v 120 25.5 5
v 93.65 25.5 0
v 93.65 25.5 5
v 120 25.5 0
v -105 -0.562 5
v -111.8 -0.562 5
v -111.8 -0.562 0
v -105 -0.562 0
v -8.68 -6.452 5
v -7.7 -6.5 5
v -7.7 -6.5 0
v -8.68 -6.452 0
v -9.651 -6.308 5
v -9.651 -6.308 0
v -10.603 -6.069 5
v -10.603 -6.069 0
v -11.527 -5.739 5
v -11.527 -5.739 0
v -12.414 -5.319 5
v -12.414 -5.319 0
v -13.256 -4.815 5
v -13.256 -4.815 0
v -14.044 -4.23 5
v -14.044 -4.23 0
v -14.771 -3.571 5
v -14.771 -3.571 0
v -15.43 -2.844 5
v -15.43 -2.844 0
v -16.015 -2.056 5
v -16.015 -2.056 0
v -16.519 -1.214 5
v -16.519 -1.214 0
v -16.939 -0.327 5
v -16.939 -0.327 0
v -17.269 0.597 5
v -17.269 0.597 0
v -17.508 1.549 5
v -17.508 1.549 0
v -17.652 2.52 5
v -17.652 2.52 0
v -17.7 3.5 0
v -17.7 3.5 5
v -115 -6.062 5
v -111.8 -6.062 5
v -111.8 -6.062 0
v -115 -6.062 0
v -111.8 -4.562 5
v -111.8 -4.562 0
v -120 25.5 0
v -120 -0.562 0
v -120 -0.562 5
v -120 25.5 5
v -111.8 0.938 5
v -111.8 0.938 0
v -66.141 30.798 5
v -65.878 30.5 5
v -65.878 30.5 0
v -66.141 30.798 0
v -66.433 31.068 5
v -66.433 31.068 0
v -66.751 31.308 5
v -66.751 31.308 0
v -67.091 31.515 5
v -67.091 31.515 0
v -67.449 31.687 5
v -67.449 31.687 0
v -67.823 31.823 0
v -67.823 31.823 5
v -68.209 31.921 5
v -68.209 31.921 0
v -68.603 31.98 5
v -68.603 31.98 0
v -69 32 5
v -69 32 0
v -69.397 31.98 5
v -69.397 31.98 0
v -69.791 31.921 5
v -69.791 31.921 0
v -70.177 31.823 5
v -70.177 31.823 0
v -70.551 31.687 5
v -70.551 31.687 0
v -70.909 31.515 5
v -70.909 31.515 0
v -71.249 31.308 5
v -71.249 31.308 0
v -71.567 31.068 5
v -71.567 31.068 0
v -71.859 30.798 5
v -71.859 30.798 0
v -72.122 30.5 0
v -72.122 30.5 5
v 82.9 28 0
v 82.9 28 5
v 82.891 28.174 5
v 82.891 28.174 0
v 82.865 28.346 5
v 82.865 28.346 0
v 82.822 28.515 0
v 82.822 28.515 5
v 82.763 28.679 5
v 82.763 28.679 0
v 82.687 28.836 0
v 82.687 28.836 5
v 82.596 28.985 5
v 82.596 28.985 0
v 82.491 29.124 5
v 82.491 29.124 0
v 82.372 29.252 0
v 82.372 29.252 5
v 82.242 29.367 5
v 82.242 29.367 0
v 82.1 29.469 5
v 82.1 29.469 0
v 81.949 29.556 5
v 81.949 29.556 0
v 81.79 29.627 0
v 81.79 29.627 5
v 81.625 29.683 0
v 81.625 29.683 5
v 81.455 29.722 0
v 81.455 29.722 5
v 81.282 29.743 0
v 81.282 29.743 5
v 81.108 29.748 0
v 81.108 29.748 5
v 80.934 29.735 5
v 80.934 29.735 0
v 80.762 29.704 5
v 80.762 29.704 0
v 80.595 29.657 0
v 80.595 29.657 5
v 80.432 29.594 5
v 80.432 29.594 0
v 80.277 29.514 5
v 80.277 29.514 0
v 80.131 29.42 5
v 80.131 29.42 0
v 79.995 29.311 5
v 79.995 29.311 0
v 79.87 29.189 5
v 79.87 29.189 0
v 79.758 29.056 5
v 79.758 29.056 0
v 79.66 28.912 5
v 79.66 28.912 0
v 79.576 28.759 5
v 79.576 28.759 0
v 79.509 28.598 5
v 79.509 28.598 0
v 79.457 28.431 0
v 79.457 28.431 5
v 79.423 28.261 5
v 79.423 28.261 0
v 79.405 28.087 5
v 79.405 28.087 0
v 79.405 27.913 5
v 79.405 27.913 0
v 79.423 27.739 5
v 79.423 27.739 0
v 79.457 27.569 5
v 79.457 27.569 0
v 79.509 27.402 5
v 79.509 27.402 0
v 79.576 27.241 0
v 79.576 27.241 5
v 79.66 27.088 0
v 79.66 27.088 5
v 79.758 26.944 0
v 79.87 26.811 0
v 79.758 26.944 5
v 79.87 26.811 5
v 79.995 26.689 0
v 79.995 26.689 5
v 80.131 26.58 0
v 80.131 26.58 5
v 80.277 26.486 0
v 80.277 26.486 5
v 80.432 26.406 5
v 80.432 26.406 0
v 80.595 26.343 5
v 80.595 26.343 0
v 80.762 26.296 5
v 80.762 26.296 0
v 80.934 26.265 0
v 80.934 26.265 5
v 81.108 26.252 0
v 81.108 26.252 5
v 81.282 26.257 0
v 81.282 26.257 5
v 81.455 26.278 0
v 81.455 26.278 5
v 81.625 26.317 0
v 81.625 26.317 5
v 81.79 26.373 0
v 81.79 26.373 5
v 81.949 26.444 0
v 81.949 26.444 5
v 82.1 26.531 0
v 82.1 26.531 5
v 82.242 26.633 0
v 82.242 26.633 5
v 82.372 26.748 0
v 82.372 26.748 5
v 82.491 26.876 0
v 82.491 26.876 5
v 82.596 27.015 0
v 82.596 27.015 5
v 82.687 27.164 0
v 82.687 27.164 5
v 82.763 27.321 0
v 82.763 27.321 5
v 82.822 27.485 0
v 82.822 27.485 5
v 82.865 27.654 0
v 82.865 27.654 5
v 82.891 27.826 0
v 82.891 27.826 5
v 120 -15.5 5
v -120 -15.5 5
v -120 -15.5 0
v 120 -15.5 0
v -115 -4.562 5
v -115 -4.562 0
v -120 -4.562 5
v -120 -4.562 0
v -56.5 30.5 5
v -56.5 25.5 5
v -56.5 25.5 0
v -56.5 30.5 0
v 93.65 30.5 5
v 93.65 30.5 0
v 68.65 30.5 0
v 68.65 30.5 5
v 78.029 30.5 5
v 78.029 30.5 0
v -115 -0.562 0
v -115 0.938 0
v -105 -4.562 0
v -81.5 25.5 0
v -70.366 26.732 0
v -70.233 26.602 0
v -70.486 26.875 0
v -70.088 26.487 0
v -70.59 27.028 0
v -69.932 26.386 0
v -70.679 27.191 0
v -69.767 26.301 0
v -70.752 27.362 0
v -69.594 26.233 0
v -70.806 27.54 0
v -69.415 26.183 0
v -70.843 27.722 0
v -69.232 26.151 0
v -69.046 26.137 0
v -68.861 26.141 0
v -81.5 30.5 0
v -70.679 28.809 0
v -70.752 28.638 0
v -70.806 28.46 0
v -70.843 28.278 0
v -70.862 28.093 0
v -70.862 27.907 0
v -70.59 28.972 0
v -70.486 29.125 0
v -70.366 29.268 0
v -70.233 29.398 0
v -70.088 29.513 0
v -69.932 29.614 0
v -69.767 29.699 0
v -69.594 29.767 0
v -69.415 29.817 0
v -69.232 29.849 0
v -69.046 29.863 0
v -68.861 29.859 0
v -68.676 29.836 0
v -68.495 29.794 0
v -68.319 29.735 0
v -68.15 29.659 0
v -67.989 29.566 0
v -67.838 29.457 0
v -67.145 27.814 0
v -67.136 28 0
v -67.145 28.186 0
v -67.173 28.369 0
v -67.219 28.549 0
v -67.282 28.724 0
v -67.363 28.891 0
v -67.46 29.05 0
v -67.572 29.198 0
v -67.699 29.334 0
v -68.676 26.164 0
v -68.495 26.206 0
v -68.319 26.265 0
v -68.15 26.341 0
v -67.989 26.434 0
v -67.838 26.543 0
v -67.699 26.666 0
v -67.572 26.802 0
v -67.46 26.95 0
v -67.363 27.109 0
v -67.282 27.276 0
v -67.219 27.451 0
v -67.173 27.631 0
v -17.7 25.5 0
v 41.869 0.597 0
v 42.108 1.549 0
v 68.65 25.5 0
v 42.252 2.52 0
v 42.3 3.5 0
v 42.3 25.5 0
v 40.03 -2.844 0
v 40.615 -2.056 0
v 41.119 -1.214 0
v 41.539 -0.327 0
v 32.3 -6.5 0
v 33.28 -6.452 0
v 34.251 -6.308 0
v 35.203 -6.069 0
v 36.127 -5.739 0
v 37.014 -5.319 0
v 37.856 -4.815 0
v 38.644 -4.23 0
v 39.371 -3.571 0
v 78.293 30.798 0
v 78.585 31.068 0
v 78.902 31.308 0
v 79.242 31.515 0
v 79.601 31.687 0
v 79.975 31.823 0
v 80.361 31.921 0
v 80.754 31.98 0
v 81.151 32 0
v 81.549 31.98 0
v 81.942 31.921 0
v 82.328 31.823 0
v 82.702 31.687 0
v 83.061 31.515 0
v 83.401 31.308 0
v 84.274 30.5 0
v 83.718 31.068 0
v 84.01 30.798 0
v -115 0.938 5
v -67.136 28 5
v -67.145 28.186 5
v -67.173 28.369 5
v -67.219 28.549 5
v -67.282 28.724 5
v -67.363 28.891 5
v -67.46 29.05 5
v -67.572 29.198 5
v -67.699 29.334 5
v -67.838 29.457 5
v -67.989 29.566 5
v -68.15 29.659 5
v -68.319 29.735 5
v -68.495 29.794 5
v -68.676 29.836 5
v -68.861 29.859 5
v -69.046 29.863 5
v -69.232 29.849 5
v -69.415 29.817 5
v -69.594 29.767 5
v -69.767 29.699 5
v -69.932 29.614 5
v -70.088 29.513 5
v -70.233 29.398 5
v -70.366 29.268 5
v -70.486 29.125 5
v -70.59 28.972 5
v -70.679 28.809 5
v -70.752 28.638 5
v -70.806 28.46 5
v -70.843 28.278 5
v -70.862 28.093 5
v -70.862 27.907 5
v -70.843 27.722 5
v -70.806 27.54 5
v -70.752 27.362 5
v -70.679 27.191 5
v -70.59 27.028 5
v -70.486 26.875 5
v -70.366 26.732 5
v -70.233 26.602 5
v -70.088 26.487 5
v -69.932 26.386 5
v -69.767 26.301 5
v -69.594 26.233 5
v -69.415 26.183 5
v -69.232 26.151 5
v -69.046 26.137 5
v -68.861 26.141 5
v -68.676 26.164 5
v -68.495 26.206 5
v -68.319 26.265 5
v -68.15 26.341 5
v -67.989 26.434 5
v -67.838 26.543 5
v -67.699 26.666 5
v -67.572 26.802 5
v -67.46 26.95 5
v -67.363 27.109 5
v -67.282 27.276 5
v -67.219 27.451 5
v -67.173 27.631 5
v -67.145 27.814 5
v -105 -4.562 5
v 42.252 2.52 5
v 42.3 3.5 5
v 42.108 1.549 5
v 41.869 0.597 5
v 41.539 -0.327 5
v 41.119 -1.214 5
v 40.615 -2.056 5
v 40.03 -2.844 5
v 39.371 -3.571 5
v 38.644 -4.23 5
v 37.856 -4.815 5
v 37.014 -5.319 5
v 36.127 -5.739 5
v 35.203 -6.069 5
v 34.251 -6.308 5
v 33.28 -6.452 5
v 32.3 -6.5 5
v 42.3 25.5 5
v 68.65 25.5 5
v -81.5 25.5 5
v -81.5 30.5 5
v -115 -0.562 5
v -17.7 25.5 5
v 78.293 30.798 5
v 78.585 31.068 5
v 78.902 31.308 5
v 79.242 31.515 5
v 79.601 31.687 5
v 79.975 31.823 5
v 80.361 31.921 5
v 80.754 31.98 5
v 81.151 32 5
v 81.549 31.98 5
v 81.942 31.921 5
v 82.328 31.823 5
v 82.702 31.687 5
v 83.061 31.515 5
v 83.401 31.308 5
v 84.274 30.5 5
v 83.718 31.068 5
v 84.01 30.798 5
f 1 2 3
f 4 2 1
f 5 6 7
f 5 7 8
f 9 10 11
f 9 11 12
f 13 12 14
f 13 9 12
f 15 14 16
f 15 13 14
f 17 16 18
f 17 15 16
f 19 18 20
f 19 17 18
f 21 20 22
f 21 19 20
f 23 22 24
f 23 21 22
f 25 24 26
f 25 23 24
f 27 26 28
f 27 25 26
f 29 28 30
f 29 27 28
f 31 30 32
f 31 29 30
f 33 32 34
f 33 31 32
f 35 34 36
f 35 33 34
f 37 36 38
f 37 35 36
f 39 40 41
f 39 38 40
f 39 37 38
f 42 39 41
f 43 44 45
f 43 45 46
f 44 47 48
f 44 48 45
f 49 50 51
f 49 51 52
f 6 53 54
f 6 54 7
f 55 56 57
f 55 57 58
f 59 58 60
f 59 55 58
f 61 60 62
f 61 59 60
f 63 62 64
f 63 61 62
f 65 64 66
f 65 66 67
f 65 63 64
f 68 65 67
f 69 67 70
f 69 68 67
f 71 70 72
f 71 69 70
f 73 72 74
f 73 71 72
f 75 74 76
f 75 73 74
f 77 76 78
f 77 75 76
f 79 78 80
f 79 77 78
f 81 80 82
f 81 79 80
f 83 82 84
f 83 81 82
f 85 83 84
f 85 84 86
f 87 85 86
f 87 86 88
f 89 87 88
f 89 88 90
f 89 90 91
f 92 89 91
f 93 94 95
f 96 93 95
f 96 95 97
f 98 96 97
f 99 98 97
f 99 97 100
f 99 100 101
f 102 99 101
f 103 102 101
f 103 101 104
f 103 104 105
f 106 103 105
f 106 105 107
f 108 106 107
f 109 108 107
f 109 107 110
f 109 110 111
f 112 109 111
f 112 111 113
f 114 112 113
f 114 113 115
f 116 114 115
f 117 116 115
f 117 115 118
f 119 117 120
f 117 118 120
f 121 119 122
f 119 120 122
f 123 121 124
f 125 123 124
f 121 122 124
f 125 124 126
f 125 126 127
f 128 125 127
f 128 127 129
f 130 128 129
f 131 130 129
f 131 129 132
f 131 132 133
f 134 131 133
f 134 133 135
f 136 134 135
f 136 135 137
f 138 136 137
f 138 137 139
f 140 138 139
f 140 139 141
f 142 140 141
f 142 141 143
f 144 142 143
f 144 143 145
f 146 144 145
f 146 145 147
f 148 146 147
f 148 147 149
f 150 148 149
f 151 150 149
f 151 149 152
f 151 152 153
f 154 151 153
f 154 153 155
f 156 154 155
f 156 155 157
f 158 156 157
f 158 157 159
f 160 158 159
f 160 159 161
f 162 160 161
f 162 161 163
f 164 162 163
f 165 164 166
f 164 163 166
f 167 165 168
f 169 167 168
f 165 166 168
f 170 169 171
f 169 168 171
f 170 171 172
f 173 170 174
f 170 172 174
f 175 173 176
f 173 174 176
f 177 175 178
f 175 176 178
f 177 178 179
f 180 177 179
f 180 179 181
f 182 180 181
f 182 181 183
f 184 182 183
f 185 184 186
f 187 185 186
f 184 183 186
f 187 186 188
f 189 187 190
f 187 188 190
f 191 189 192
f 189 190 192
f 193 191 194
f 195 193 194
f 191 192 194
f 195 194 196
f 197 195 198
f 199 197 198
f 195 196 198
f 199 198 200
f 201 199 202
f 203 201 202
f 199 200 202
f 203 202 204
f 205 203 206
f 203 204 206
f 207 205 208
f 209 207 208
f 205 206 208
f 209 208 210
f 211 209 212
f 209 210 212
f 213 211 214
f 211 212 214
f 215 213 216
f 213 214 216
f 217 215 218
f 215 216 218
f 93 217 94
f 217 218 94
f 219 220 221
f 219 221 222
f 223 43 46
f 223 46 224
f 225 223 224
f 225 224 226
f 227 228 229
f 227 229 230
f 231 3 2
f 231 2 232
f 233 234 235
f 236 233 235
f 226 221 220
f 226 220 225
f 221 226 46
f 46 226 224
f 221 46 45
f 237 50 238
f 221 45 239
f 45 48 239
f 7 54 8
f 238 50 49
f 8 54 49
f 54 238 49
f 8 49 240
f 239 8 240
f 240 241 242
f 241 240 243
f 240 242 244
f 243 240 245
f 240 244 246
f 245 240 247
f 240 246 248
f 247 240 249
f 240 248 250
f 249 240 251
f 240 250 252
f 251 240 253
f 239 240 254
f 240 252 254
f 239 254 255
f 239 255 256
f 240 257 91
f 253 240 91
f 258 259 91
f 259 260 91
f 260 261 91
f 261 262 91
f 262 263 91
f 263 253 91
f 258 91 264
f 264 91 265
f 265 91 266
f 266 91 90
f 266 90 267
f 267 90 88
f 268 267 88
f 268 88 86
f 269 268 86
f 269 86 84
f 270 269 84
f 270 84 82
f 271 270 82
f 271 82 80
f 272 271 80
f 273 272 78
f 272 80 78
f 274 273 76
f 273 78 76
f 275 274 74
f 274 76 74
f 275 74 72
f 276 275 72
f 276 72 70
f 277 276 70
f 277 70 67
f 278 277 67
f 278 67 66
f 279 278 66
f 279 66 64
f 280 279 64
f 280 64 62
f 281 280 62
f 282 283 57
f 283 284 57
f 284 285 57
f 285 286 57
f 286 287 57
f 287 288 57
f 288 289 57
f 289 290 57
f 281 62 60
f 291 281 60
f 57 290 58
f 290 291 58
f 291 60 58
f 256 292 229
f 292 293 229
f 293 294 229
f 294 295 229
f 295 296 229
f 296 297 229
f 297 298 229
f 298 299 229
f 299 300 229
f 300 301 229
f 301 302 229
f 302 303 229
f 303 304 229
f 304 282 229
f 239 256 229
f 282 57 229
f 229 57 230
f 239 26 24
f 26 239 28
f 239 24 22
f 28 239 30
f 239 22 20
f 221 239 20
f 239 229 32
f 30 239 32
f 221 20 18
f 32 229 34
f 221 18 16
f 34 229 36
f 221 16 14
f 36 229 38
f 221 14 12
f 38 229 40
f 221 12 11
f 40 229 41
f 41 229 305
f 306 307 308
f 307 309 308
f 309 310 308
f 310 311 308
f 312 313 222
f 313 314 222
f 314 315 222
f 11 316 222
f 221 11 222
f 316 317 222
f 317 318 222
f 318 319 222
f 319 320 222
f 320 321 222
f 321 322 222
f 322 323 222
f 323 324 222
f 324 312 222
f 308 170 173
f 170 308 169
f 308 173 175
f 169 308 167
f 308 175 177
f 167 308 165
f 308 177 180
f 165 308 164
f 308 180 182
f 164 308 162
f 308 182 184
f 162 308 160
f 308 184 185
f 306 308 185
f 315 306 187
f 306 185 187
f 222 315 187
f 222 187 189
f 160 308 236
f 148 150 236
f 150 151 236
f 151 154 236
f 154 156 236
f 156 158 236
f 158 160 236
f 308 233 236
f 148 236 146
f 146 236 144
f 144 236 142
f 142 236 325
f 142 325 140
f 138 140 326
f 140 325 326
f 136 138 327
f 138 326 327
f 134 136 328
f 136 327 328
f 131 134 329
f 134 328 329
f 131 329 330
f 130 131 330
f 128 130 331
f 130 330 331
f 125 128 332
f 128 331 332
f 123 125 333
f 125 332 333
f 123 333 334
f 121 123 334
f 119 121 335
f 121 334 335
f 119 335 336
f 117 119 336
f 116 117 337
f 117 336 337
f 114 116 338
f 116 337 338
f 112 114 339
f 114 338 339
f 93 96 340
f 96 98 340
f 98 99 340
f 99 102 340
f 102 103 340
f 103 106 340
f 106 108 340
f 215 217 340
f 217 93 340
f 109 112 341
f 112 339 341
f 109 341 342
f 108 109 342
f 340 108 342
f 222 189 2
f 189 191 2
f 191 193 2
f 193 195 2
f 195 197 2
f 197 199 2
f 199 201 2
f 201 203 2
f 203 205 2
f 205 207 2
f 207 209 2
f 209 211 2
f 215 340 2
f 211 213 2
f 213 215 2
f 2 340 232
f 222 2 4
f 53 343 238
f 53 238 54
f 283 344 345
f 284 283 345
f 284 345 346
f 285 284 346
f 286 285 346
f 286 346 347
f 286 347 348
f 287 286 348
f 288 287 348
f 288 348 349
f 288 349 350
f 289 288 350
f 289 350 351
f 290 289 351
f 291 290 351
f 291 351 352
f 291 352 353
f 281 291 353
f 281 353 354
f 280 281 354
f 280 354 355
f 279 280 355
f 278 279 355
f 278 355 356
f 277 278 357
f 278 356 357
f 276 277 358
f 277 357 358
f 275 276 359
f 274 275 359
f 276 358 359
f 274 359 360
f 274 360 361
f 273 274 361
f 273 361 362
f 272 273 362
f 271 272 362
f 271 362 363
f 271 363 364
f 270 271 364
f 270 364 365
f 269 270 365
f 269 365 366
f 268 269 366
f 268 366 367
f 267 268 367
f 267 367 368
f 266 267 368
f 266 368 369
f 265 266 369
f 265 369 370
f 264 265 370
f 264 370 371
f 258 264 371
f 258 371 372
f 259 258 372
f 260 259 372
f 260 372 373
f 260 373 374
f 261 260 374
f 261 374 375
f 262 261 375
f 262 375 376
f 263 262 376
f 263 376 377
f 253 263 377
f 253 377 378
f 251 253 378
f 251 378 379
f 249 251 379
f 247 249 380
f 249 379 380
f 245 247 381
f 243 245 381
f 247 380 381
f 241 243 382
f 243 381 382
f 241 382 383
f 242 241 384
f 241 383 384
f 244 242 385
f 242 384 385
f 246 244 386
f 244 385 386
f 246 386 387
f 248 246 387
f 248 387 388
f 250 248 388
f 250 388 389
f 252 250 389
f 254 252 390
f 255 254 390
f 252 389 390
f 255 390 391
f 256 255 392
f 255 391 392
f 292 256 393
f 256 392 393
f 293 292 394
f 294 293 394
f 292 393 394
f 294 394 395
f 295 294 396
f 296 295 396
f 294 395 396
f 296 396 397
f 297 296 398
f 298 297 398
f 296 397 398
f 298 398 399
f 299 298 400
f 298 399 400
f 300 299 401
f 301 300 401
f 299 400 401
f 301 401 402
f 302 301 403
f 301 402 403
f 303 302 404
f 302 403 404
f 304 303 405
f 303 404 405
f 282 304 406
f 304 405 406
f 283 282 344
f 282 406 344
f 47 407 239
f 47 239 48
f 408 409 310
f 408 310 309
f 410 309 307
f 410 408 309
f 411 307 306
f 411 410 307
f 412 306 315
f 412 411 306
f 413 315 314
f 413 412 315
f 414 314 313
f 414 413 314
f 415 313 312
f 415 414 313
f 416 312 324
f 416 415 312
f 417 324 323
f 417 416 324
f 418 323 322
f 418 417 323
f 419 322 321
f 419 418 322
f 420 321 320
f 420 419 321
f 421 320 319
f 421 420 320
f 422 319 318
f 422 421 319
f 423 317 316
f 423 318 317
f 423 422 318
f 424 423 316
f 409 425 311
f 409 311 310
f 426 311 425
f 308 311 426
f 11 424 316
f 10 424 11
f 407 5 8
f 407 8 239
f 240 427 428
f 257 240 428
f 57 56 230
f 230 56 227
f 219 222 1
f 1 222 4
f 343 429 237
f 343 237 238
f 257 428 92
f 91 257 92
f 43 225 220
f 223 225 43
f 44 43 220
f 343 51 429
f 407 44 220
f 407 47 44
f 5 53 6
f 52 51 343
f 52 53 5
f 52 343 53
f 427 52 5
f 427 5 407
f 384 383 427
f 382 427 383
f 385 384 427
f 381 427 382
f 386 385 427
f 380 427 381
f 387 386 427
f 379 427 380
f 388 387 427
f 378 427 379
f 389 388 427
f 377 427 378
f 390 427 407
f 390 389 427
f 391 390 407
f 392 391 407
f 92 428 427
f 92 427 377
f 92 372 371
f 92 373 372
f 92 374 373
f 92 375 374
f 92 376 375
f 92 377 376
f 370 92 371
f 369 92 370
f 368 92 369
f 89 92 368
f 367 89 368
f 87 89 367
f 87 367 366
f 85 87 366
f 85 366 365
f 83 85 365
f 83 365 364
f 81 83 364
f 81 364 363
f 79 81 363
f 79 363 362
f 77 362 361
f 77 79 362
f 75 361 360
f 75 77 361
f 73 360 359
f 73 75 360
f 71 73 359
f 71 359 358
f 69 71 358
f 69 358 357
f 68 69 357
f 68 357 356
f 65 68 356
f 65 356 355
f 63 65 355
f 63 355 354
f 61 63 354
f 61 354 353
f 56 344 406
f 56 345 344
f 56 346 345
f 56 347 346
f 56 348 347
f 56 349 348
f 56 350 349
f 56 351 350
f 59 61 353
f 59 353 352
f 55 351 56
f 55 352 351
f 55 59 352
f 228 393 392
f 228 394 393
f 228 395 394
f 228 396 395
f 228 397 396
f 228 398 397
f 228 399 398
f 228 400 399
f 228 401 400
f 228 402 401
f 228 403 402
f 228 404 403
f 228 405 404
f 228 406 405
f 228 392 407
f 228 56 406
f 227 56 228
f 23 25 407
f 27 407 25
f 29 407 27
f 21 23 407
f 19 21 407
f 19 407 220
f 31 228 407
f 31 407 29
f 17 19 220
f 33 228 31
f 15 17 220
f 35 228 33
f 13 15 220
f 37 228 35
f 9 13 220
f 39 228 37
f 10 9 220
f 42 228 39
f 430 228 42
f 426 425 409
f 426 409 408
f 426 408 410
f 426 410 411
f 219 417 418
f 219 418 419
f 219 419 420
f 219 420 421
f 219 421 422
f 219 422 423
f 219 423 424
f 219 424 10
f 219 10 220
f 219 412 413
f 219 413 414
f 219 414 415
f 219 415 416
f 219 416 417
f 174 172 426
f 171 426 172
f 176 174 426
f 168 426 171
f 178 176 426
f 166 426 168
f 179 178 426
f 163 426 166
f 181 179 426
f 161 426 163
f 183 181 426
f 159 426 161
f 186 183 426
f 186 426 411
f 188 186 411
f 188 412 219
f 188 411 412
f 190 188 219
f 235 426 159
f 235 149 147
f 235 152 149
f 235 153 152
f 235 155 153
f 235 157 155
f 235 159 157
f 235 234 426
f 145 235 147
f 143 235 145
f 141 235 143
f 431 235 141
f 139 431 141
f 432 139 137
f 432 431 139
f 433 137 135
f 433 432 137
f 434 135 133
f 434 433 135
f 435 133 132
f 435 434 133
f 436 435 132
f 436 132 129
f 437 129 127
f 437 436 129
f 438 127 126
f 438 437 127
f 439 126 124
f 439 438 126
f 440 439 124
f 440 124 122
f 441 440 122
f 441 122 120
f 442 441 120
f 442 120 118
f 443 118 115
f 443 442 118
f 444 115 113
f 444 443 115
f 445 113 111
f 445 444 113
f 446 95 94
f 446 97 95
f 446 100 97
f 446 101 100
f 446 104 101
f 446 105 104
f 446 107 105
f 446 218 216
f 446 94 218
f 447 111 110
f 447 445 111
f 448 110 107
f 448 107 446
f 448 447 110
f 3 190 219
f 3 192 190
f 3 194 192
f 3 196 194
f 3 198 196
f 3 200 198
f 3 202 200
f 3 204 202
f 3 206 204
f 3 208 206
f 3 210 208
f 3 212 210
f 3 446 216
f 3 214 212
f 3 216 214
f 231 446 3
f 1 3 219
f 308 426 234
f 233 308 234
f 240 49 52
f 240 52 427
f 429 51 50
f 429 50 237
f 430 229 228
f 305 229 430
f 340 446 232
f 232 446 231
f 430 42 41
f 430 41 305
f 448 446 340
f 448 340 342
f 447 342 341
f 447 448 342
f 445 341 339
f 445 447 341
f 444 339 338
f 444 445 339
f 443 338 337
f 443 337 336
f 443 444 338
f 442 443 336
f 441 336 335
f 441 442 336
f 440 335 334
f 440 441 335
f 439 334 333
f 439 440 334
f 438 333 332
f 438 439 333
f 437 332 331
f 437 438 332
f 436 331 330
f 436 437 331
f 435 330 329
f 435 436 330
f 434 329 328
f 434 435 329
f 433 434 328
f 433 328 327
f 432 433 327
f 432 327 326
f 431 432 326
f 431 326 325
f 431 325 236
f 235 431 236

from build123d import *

# Parameters (mm, degrees)
SKETCH1_W           = 240
SKETCH1_H           = 51
BOSS_EXTRUDE1_DEPTH = 5
SKETCH4_W           = 25
SKETCH4_H           = 5
BOSS_EXTRUDE2_DEPTH = 5
CUT_EXTRUDE1_DEPTH  = 10
CUT_EXTRUDE4_DEPTH  = 10
SKETCH15_W          = 25
SKETCH15_H          = 5
BOSS_EXTRUDE4_DEPTH = 5
SKETCH17_R          = 1.863928877
SKETCH17_R_2        = 1.748329033
CUT_EXTRUDE5_DEPTH  = 10
SKETCH18_R          = 4
SKETCH18_R_2        = 1.748329033
SKETCH18_R_3        = 1.863928877
BOSS_EXTRUDE5_DEPTH = 5
SKETCH19_W          = 240
SKETCH19_H          = 10
CUT_EXTRUDE6_DEPTH  = 10


with BuildPart() as part:
    # Sketch1 → Boss-Extrude1 (new body)
    with BuildSketch(Plane.XY):
        Rectangle(SKETCH1_W, SKETCH1_H)
    extrude(amount=BOSS_EXTRUDE1_DEPTH)

    # Sketch4 → Boss-Extrude2 (add)
    with BuildSketch(Plane.XY.offset(5)):
        with Locations((-69, 28)):
            Rectangle(SKETCH4_W, SKETCH4_H)
    extrude(amount=-BOSS_EXTRUDE2_DEPTH)

    # Sketch6 → Cut-Extrude1 (cut)
    with BuildSketch(Plane.XY.offset(5)):
        Polygon((-115, -4.562158061), (-120, -4.562158061), (-120, -0.562158061), (-115, -0.562158061), (-115, 0.937841939), (-111.8, 0.937841939), (-111.8, -0.562158061), (-105, -0.562158061), (-105, -4.562158061), (-111.8, -4.562158061), (-111.8, -6.062158061), (-115, -6.062158061), align=None)
    extrude(amount=-CUT_EXTRUDE1_DEPTH, mode=Mode.SUBTRACT)

    # Sketch14 → Cut-Extrude4 (cut)
    with BuildSketch(Plane.XY.offset(5)):
        with BuildLine():
            Line((-17.7, 25.5), (42.3, 25.5))
            Line((42.3, 25.5), (42.3, 3.5))
            ThreePointArc((42.3, 3.5), (39.371067812, -3.571067812), (32.3, -6.5))
            Line((32.3, -6.5), (-7.7, -6.5))
            ThreePointArc((-7.7, -6.5), (-14.771067812, -3.571067812), (-17.7, 3.5))
            Line((-17.7, 3.5), (-17.7, 25.5))
        make_face()
    extrude(amount=-CUT_EXTRUDE4_DEPTH, mode=Mode.SUBTRACT)

    # Sketch15 → Boss-Extrude4 (add)
    with BuildSketch(Plane.XY.offset(5)):
        with Locations((81.15, 28)):
            Rectangle(SKETCH15_W, SKETCH15_H)
    extrude(amount=-BOSS_EXTRUDE4_DEPTH)

    # Sketch17 → Cut-Extrude5 (cut)
    with BuildSketch(Plane.XY.offset(5)):
        with Locations((-69, 28)):
            Circle(SKETCH17_R)
        with Locations((81.151489704, 28)):
            Circle(SKETCH17_R_2)
    extrude(amount=-CUT_EXTRUDE5_DEPTH, mode=Mode.SUBTRACT)

    # Sketch18 → Boss-Extrude5 (add)
    # profile 1 of 2: a face of its own
    with BuildSketch(Plane.XY.offset(5)):
        with Locations((81.151489704, 28)):
            Circle(SKETCH18_R)
        with Locations((81.151489704, 28)):
            Circle(SKETCH18_R_2, mode=Mode.SUBTRACT)
    # profile 2 of 2: a face of its own
    with BuildSketch(Plane.XY.offset(5)):
        with Locations((-69, 28)):
            Circle(SKETCH18_R)
        with Locations((-69, 28)):
            Circle(SKETCH18_R_3, mode=Mode.SUBTRACT)
    extrude(amount=-BOSS_EXTRUDE5_DEPTH)

    # Sketch19 → Cut-Extrude6 (cut)
    with BuildSketch(Plane.XY.offset(5)):
        with Locations((0, -20.5)):
            Rectangle(SKETCH19_W, SKETCH19_H)
    extrude(amount=-CUT_EXTRUDE6_DEPTH, mode=Mode.SUBTRACT)


solid = part.part
